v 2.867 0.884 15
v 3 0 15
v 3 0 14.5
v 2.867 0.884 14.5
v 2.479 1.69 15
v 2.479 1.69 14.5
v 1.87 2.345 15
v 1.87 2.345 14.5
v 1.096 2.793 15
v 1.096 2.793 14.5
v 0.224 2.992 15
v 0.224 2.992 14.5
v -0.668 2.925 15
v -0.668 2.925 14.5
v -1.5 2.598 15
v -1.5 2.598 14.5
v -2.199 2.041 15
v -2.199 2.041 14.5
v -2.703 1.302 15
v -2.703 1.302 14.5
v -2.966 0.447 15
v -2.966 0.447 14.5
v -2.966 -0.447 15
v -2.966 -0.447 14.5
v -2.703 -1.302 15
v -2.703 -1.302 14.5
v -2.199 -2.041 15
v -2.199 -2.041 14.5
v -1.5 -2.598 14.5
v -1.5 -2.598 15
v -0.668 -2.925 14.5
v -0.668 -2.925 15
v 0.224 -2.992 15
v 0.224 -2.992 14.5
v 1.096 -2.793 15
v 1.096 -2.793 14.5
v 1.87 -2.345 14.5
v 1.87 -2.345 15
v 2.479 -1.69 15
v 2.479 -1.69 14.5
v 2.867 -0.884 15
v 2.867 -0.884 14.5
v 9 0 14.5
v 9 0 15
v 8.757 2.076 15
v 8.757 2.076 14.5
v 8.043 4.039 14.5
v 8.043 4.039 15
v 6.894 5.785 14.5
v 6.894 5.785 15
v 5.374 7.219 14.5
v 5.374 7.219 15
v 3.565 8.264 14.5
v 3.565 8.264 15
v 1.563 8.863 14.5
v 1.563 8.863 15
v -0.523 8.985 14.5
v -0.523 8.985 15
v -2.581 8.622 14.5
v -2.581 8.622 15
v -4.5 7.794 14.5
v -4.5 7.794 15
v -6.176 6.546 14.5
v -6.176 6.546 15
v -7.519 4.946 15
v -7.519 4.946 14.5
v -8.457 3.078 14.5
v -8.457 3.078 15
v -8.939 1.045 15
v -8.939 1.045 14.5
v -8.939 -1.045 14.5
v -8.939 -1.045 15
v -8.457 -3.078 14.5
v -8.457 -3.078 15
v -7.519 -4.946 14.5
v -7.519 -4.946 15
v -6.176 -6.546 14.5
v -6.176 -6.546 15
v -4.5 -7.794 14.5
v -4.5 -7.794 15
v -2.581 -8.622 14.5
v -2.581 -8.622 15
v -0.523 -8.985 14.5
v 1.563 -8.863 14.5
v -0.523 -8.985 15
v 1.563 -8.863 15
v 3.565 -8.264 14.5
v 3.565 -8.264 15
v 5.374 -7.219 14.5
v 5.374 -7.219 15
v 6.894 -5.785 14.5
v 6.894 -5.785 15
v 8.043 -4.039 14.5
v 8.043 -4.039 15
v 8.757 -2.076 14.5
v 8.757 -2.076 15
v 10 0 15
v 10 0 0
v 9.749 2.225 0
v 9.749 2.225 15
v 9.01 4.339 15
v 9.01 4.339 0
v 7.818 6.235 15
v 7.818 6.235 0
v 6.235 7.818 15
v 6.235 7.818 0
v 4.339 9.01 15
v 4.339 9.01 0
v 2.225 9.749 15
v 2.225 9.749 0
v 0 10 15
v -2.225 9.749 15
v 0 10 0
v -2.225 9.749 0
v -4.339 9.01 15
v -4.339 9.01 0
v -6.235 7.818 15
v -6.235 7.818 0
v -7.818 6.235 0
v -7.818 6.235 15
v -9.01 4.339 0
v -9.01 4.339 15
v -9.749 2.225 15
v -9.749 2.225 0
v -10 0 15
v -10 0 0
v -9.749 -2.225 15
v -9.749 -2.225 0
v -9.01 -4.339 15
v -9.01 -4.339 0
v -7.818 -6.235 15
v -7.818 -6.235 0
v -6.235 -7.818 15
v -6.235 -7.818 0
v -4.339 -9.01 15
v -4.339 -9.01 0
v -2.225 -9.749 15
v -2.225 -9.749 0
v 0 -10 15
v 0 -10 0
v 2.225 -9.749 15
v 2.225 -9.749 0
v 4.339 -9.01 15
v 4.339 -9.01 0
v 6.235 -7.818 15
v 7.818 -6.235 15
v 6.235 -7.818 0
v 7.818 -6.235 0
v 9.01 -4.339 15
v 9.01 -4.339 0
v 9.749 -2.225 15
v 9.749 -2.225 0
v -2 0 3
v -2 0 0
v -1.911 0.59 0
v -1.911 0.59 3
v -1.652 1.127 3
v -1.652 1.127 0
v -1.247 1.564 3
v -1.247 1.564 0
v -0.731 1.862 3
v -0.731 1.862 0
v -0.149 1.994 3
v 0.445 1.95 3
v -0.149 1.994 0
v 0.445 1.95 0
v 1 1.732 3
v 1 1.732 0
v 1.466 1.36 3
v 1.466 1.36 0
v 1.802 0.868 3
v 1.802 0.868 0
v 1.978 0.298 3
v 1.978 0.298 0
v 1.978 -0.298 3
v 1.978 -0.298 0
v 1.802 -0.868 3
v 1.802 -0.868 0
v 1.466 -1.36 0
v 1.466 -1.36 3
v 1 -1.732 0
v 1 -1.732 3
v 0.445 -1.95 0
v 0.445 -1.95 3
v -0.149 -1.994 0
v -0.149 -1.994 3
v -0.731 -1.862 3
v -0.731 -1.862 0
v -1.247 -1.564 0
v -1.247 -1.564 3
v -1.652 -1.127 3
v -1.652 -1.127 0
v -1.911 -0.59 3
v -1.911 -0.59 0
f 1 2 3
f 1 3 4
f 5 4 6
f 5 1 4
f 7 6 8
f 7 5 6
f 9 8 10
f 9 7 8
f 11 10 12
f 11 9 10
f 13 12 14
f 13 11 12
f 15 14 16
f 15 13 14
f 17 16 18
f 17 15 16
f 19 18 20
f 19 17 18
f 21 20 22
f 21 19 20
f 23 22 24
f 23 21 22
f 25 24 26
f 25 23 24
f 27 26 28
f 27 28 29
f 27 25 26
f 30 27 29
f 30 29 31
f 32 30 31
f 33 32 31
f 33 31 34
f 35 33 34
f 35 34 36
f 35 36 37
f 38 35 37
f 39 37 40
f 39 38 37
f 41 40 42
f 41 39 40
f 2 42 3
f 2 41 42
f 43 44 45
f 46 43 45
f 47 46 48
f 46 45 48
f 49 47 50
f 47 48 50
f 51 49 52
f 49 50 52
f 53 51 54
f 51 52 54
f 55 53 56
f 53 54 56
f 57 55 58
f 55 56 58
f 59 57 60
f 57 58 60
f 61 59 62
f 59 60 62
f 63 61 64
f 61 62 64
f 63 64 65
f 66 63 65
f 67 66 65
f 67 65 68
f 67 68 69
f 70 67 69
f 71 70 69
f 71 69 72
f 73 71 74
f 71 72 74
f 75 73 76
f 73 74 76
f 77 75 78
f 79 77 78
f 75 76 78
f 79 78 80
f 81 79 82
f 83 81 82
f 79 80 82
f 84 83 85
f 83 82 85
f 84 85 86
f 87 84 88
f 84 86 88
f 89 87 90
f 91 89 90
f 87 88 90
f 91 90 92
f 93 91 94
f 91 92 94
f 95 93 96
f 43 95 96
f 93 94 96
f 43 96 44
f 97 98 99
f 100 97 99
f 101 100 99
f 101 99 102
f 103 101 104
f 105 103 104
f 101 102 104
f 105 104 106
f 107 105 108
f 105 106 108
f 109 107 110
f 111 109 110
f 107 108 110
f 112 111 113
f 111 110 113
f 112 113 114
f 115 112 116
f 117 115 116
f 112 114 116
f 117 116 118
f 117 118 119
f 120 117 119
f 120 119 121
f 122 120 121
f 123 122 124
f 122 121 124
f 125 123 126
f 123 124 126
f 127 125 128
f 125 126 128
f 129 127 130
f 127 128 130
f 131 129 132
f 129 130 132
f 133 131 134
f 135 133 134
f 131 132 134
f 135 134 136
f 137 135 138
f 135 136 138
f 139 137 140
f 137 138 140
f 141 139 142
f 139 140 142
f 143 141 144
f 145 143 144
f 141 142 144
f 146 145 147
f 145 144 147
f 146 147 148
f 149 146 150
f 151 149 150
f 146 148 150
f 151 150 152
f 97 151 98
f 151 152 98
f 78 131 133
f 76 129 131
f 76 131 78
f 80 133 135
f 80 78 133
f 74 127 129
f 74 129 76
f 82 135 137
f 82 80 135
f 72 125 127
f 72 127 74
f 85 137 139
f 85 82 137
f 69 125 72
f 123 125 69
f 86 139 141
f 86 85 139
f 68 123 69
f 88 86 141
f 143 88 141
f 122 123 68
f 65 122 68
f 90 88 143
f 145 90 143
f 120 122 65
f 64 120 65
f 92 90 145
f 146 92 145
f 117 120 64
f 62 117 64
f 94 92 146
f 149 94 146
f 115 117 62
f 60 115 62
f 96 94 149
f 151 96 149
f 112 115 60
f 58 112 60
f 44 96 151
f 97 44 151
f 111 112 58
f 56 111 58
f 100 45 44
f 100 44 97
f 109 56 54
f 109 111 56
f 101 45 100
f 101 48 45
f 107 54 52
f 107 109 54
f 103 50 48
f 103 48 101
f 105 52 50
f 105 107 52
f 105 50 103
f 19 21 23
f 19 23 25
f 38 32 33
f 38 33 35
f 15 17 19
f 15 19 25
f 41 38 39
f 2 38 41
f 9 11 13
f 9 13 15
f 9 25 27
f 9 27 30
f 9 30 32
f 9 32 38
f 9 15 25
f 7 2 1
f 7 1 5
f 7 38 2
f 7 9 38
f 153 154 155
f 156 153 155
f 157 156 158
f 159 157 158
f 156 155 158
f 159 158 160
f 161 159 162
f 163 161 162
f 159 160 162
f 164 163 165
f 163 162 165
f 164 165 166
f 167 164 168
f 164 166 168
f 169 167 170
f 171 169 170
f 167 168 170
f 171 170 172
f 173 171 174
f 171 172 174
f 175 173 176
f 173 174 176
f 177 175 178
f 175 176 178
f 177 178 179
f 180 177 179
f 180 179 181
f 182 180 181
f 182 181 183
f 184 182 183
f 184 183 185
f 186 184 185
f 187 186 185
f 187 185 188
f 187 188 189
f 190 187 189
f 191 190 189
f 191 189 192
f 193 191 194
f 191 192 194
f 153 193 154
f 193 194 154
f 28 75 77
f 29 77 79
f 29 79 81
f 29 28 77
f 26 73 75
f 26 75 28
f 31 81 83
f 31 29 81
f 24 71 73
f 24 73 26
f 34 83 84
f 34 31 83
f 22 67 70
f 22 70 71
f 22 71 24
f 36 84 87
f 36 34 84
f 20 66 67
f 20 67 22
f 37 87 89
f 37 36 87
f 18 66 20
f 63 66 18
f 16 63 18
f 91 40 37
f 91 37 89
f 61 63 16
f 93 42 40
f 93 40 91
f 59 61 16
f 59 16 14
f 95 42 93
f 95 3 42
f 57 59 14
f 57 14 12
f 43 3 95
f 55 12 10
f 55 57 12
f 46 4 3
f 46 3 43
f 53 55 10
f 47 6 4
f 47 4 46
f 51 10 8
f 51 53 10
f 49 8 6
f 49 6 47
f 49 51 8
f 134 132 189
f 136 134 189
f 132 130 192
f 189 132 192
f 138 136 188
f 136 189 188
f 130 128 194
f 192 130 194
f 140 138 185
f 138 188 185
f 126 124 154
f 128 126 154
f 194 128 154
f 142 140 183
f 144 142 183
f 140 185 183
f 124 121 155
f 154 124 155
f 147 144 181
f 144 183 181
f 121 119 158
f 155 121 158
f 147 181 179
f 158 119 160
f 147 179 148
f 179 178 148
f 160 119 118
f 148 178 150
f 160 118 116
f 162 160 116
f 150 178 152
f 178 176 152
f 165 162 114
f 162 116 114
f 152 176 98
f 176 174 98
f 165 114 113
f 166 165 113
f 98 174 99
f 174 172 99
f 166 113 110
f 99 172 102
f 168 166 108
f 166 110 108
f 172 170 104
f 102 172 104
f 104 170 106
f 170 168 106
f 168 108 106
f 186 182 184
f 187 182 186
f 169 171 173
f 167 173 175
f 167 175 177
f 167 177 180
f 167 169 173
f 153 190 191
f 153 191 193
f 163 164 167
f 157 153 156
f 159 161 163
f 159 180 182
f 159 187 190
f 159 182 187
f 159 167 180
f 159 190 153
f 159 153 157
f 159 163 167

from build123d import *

# Parameters (mm, degrees)
SKETCH1_R           = 10
BOSS_EXTRUDE1_DEPTH = 15
SKETCH2_R           = 9
SKETCH2_R_2         = 3
CUT_EXTRUDE1_DEPTH  = 0.5
SKETCH3_R           = 2
CUT_EXTRUDE2_DEPTH  = 3


with BuildPart() as part:
    # Sketch1 → Boss-Extrude1 (new body)
    with BuildSketch(Plane.XY):
        Circle(SKETCH1_R)
    extrude(amount=BOSS_EXTRUDE1_DEPTH)

    # Sketch2 → Cut-Extrude1 (cut)
    with BuildSketch(Plane.XY.offset(15)):
        Circle(SKETCH2_R)
        Circle(SKETCH2_R_2, mode=Mode.SUBTRACT)
    extrude(amount=-CUT_EXTRUDE1_DEPTH, mode=Mode.SUBTRACT)

    # Sketch3 → Cut-Extrude2 (cut)
    with BuildSketch(Plane(origin=(0, 0, 0), x_dir=(-1, 0, 0), z_dir=(0, 0, -1))):
        Circle(SKETCH3_R)
    extrude(amount=-CUT_EXTRUDE2_DEPTH, mode=Mode.SUBTRACT)


solid = part.part
